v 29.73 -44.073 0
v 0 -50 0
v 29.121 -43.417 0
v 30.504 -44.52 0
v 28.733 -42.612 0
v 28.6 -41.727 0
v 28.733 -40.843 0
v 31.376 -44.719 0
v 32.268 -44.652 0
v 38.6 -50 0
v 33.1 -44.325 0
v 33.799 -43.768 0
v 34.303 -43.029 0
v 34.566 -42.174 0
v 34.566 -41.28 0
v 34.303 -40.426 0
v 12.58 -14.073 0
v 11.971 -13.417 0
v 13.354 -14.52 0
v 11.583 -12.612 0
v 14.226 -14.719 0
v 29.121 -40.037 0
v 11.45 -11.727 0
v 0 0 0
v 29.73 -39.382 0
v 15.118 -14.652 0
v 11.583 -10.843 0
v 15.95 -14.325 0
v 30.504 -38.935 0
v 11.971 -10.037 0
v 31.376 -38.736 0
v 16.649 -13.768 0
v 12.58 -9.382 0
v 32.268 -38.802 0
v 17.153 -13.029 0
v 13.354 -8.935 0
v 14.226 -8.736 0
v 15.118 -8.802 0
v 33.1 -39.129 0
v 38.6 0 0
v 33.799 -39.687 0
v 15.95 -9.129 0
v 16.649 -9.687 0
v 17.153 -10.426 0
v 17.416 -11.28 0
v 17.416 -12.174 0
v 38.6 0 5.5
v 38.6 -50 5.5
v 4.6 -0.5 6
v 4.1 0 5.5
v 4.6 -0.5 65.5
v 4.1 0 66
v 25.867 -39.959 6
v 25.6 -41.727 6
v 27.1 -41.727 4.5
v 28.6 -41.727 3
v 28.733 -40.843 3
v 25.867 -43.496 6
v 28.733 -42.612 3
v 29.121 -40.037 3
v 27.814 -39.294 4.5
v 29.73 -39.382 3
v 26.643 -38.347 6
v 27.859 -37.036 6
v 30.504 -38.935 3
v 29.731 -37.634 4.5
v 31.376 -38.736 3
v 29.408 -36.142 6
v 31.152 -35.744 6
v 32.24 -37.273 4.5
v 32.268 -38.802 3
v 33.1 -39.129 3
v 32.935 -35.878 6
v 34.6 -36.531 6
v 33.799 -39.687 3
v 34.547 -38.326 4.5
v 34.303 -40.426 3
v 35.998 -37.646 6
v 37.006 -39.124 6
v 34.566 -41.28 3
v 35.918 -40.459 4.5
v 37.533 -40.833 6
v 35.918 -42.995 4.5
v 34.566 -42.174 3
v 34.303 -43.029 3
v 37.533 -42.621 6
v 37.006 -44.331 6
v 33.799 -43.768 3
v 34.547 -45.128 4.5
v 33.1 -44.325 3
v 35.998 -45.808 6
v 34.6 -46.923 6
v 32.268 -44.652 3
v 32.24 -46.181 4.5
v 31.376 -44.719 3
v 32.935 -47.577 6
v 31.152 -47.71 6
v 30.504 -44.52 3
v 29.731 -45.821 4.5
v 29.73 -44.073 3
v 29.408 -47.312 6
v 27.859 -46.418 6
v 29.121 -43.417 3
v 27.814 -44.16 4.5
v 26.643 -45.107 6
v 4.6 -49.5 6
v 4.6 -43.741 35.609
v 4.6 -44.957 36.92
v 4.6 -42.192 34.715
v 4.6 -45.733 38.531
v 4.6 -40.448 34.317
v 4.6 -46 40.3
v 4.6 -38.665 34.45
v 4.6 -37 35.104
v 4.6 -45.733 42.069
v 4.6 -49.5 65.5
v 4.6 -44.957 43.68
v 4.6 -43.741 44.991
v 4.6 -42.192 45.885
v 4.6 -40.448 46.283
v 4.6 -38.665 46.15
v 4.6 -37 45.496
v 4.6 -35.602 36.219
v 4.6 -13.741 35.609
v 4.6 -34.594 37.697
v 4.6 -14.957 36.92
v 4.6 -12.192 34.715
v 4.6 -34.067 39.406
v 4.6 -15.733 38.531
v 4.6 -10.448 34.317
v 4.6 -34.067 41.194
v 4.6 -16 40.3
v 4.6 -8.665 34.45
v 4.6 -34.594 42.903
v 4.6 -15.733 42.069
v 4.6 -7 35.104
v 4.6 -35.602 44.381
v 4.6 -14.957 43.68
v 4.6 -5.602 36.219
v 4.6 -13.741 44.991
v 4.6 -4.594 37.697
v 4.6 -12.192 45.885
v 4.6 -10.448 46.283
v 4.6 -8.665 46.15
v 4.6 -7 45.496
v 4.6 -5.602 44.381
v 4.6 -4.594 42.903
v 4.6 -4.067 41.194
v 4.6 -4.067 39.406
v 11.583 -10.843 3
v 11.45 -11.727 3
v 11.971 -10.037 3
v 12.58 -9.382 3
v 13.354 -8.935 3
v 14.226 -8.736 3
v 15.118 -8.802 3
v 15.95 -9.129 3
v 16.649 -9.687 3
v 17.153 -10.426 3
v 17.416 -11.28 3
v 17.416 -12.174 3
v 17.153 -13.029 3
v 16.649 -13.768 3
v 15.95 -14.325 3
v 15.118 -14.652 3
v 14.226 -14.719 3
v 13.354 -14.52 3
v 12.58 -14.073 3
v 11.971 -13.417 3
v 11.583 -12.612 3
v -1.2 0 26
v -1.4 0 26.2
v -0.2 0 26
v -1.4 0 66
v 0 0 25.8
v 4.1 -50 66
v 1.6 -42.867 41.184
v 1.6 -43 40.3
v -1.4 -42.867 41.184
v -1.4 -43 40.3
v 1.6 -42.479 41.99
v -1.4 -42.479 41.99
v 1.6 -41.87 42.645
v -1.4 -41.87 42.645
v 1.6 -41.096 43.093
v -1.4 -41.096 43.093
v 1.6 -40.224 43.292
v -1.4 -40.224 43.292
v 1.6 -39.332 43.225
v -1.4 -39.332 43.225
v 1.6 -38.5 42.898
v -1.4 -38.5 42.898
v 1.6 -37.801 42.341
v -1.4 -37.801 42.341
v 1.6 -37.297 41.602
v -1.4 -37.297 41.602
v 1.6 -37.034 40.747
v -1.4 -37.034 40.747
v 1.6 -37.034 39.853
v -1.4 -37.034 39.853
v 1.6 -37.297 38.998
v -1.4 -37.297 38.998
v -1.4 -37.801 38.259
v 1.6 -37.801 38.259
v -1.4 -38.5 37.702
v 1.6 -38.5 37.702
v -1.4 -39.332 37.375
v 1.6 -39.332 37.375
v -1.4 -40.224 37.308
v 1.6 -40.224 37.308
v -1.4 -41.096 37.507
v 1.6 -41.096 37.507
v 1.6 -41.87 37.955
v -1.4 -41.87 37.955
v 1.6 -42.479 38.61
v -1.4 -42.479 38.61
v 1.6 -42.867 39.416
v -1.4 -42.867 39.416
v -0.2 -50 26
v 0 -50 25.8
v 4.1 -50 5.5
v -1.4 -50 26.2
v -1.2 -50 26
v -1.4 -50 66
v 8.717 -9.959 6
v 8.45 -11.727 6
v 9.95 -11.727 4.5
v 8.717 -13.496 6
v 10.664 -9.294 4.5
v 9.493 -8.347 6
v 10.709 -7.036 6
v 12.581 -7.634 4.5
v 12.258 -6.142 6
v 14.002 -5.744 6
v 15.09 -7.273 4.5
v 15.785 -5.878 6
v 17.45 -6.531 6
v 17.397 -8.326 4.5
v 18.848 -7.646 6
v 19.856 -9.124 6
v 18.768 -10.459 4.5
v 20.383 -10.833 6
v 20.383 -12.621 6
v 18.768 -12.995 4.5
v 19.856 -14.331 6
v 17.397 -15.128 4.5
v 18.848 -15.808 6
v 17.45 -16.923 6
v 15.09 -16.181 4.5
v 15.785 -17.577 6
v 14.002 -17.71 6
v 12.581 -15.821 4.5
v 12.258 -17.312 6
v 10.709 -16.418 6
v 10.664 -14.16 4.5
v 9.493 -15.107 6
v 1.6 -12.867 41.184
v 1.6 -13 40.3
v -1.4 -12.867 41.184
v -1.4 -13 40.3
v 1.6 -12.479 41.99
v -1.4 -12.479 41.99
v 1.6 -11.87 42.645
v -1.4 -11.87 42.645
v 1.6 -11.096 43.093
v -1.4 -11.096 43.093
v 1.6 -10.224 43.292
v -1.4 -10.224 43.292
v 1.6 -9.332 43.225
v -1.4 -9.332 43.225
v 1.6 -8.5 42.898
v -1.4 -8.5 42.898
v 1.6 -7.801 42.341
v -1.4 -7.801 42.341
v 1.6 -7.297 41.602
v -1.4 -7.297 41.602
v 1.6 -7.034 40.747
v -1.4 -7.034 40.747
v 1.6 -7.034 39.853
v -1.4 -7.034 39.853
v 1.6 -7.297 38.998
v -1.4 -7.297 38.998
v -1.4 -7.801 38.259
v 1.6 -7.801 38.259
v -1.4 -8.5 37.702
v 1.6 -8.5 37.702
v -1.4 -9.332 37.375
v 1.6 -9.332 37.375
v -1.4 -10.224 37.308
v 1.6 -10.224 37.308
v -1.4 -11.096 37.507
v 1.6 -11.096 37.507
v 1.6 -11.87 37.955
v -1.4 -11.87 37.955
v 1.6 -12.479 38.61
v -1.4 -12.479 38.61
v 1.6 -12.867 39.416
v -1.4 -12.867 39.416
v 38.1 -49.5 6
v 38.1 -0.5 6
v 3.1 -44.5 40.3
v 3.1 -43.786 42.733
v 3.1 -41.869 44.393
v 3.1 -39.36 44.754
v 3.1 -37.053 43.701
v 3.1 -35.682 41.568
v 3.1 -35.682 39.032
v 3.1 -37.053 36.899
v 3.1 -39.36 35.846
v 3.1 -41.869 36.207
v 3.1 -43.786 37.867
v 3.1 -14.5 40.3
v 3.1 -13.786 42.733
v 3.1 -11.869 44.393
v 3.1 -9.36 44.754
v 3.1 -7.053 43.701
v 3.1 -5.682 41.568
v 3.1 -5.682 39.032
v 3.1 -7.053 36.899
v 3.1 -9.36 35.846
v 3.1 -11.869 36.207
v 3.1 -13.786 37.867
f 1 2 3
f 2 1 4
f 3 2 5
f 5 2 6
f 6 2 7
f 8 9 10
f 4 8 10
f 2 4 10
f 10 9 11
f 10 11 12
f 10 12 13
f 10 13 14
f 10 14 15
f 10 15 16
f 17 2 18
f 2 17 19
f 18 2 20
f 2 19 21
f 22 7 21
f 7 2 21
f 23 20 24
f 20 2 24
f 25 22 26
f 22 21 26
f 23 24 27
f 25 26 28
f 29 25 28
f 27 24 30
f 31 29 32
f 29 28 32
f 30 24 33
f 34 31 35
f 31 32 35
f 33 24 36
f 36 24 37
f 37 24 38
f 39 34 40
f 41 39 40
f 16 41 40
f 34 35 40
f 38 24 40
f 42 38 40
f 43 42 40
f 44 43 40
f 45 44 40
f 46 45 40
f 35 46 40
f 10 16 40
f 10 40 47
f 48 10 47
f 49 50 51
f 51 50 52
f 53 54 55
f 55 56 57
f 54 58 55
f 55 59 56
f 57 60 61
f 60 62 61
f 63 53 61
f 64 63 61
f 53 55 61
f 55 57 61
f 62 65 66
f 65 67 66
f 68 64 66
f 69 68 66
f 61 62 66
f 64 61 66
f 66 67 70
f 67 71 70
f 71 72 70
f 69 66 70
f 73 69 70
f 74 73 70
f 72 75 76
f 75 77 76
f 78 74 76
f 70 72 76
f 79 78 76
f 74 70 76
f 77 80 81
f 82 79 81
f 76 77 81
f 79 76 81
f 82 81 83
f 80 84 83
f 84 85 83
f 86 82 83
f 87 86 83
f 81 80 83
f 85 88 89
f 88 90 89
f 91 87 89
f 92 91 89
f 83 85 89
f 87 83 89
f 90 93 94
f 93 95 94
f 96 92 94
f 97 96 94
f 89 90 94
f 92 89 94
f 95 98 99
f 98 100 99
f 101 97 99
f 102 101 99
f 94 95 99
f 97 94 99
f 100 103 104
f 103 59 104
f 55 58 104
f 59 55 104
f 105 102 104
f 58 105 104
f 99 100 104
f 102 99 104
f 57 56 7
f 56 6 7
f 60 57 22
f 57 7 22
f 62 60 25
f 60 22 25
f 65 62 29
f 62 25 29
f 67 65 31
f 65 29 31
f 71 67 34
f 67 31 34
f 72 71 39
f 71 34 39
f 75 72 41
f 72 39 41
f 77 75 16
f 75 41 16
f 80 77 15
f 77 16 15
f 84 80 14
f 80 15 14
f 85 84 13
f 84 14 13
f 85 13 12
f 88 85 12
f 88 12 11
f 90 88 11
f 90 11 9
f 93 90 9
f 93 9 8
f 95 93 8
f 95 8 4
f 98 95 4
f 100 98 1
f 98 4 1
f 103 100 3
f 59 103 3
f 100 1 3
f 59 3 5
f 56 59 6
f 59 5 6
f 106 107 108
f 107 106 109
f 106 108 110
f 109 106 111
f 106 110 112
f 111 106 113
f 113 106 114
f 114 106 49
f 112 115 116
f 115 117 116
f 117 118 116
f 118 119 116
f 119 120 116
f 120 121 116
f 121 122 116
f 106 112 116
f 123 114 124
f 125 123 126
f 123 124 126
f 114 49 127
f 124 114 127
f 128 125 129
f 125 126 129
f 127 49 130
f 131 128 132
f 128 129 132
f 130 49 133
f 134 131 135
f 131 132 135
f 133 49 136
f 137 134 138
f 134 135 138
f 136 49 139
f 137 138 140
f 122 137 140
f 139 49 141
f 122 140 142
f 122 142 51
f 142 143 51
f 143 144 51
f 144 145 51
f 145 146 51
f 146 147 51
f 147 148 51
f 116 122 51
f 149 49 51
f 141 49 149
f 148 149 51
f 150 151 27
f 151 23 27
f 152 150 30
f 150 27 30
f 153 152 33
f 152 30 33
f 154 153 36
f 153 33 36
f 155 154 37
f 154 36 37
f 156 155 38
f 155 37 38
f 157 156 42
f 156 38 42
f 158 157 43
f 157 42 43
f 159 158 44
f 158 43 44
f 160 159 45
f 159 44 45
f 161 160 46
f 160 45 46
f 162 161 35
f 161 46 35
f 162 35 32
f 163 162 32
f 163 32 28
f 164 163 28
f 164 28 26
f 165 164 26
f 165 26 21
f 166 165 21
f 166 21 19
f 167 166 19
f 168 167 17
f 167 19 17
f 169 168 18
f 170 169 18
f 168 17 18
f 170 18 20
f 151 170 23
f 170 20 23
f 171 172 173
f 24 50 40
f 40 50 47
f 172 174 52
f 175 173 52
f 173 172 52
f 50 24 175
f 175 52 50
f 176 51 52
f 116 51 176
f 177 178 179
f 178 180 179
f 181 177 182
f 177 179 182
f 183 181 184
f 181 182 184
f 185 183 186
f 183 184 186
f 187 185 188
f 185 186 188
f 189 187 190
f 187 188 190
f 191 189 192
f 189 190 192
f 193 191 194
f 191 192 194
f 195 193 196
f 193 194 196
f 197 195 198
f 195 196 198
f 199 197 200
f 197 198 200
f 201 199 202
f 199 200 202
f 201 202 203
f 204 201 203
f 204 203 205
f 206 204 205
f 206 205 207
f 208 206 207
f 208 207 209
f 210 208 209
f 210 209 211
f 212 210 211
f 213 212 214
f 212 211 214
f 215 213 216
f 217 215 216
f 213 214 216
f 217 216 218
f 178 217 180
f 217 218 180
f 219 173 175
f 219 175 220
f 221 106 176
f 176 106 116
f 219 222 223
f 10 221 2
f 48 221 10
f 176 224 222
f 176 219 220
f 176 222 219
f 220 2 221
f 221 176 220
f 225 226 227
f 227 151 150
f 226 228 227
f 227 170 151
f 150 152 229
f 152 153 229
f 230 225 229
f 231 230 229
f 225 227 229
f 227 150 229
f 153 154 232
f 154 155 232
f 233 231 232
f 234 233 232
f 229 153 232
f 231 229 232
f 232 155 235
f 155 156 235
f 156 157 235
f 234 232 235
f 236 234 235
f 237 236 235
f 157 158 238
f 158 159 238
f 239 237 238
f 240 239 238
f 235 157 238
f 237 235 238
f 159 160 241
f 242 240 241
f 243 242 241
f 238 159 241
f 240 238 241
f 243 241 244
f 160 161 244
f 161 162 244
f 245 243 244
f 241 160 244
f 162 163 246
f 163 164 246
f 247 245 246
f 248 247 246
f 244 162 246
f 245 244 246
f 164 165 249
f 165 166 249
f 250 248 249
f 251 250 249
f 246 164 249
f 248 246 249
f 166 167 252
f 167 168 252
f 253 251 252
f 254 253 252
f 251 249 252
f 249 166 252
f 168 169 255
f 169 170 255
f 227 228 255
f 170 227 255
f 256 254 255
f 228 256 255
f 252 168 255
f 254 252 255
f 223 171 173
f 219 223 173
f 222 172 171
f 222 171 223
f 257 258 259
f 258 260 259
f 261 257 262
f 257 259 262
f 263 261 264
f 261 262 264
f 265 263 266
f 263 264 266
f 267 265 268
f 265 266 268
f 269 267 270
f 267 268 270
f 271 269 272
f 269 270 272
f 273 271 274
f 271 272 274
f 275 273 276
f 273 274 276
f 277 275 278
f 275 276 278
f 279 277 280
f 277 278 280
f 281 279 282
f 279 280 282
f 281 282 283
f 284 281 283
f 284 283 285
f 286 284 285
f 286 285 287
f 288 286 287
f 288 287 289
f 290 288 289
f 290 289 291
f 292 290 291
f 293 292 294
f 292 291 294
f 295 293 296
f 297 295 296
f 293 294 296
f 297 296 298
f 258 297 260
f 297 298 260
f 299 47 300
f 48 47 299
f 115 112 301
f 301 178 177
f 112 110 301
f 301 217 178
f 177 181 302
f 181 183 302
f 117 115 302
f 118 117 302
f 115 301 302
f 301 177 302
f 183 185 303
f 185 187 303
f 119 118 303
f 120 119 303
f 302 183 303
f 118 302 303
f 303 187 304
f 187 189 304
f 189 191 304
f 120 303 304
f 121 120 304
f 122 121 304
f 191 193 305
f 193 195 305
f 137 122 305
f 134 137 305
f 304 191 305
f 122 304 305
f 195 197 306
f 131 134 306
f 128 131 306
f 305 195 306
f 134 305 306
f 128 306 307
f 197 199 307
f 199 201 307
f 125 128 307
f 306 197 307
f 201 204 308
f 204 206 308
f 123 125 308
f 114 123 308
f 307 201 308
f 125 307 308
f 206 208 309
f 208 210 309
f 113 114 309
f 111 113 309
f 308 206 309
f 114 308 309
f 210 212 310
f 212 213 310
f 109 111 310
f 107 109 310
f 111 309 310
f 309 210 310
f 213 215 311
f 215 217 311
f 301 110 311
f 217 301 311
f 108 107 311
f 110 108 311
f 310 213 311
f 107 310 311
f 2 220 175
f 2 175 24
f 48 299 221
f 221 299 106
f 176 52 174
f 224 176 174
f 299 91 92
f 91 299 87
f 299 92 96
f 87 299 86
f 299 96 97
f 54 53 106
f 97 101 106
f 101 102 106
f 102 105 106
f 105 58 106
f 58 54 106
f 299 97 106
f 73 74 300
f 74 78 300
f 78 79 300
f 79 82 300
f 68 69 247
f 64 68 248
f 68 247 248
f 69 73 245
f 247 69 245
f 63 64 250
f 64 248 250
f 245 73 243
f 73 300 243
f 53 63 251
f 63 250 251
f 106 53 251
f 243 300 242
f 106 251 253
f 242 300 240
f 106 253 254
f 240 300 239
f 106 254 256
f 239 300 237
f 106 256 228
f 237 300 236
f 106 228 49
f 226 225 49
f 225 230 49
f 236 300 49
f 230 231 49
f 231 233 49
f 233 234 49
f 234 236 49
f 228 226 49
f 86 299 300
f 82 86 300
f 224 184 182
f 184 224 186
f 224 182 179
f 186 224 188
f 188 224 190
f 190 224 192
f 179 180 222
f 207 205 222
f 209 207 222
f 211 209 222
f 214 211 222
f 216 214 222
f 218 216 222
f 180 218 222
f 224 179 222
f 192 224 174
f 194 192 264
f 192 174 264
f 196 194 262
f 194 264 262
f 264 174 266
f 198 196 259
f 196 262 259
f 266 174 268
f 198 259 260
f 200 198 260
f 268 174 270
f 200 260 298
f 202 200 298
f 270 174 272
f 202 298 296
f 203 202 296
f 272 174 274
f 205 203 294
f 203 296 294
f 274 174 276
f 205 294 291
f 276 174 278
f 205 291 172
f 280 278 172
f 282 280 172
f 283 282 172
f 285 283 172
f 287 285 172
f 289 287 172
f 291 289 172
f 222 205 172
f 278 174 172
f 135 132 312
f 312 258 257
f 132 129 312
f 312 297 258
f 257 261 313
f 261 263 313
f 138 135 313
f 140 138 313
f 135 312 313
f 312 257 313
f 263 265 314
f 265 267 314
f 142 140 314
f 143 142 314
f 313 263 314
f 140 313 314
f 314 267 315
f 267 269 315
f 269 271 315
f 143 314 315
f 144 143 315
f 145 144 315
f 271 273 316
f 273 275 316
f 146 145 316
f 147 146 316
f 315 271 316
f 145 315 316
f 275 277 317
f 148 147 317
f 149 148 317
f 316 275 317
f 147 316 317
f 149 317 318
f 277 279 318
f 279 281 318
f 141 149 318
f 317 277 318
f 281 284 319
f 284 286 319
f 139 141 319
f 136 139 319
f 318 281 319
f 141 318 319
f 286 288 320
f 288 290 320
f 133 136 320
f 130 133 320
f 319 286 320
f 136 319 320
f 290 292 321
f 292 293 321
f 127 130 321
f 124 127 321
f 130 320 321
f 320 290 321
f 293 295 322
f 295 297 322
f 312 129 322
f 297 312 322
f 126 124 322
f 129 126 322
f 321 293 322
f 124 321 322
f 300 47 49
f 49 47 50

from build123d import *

# Parameters (mm, degrees)
F1_DEPTH       = 50
F3_D           = 6
F3_DEPTH       = 12
F3_CSINK_D     = 12
F3_CSINK_ANGLE = 90
F5_D           = 6
F5_DEPTH       = 12
F5_CSINK_D     = 12
F5_CSINK_ANGLE = 90
F6_SIZE        = 0.5
F7_SIZE        = 0.2


with BuildPart() as f1:
    # F0 (on Front) → F1 (new body)
    with BuildSketch(Plane.XZ):
        Polygon((0, 26), (0, 0), (38.6, 0), (38.6, 6), (4.6, 6), (4.6, 66), (-1.4, 66), (-1.4, 26), align=None)
    extrude(amount=F1_DEPTH)

    # F3
    with Locations(Plane.YZ.offset(4.6)):
        with Locations((-40, 40.3), (-10, 40.3)):
            CounterSinkHole(F3_D / 2, F3_CSINK_D / 2, depth=F3_DEPTH, counter_sink_angle=F3_CSINK_ANGLE)

    # F5
    with Locations(Plane.XY.offset(6)):
        with Locations((14.45, -11.727238), (31.6, -41.727238)):
            CounterSinkHole(F5_D / 2, F5_CSINK_D / 2, depth=F5_DEPTH, counter_sink_angle=F5_CSINK_ANGLE)

    # F6
    f6_edges = [f1.edges().sort_by_distance(p)[0] for p in [
        (4.6, -25, 66),
        (4.6, -50, 36),
        (4.6, 0, 36),
        (21.6, -50, 6),
        (38.6, -25, 6),
        (21.6, 0, 6),
    ]]
    chamfer(f6_edges, length=F6_SIZE)

    # F7
    f7_edges = [f1.edges().sort_by_distance(p)[0] for p in [
        (-1.4, -25, 26),
        (0, -25, 26),
    ]]
    chamfer(f7_edges, length=F7_SIZE)


solid = f1.part
